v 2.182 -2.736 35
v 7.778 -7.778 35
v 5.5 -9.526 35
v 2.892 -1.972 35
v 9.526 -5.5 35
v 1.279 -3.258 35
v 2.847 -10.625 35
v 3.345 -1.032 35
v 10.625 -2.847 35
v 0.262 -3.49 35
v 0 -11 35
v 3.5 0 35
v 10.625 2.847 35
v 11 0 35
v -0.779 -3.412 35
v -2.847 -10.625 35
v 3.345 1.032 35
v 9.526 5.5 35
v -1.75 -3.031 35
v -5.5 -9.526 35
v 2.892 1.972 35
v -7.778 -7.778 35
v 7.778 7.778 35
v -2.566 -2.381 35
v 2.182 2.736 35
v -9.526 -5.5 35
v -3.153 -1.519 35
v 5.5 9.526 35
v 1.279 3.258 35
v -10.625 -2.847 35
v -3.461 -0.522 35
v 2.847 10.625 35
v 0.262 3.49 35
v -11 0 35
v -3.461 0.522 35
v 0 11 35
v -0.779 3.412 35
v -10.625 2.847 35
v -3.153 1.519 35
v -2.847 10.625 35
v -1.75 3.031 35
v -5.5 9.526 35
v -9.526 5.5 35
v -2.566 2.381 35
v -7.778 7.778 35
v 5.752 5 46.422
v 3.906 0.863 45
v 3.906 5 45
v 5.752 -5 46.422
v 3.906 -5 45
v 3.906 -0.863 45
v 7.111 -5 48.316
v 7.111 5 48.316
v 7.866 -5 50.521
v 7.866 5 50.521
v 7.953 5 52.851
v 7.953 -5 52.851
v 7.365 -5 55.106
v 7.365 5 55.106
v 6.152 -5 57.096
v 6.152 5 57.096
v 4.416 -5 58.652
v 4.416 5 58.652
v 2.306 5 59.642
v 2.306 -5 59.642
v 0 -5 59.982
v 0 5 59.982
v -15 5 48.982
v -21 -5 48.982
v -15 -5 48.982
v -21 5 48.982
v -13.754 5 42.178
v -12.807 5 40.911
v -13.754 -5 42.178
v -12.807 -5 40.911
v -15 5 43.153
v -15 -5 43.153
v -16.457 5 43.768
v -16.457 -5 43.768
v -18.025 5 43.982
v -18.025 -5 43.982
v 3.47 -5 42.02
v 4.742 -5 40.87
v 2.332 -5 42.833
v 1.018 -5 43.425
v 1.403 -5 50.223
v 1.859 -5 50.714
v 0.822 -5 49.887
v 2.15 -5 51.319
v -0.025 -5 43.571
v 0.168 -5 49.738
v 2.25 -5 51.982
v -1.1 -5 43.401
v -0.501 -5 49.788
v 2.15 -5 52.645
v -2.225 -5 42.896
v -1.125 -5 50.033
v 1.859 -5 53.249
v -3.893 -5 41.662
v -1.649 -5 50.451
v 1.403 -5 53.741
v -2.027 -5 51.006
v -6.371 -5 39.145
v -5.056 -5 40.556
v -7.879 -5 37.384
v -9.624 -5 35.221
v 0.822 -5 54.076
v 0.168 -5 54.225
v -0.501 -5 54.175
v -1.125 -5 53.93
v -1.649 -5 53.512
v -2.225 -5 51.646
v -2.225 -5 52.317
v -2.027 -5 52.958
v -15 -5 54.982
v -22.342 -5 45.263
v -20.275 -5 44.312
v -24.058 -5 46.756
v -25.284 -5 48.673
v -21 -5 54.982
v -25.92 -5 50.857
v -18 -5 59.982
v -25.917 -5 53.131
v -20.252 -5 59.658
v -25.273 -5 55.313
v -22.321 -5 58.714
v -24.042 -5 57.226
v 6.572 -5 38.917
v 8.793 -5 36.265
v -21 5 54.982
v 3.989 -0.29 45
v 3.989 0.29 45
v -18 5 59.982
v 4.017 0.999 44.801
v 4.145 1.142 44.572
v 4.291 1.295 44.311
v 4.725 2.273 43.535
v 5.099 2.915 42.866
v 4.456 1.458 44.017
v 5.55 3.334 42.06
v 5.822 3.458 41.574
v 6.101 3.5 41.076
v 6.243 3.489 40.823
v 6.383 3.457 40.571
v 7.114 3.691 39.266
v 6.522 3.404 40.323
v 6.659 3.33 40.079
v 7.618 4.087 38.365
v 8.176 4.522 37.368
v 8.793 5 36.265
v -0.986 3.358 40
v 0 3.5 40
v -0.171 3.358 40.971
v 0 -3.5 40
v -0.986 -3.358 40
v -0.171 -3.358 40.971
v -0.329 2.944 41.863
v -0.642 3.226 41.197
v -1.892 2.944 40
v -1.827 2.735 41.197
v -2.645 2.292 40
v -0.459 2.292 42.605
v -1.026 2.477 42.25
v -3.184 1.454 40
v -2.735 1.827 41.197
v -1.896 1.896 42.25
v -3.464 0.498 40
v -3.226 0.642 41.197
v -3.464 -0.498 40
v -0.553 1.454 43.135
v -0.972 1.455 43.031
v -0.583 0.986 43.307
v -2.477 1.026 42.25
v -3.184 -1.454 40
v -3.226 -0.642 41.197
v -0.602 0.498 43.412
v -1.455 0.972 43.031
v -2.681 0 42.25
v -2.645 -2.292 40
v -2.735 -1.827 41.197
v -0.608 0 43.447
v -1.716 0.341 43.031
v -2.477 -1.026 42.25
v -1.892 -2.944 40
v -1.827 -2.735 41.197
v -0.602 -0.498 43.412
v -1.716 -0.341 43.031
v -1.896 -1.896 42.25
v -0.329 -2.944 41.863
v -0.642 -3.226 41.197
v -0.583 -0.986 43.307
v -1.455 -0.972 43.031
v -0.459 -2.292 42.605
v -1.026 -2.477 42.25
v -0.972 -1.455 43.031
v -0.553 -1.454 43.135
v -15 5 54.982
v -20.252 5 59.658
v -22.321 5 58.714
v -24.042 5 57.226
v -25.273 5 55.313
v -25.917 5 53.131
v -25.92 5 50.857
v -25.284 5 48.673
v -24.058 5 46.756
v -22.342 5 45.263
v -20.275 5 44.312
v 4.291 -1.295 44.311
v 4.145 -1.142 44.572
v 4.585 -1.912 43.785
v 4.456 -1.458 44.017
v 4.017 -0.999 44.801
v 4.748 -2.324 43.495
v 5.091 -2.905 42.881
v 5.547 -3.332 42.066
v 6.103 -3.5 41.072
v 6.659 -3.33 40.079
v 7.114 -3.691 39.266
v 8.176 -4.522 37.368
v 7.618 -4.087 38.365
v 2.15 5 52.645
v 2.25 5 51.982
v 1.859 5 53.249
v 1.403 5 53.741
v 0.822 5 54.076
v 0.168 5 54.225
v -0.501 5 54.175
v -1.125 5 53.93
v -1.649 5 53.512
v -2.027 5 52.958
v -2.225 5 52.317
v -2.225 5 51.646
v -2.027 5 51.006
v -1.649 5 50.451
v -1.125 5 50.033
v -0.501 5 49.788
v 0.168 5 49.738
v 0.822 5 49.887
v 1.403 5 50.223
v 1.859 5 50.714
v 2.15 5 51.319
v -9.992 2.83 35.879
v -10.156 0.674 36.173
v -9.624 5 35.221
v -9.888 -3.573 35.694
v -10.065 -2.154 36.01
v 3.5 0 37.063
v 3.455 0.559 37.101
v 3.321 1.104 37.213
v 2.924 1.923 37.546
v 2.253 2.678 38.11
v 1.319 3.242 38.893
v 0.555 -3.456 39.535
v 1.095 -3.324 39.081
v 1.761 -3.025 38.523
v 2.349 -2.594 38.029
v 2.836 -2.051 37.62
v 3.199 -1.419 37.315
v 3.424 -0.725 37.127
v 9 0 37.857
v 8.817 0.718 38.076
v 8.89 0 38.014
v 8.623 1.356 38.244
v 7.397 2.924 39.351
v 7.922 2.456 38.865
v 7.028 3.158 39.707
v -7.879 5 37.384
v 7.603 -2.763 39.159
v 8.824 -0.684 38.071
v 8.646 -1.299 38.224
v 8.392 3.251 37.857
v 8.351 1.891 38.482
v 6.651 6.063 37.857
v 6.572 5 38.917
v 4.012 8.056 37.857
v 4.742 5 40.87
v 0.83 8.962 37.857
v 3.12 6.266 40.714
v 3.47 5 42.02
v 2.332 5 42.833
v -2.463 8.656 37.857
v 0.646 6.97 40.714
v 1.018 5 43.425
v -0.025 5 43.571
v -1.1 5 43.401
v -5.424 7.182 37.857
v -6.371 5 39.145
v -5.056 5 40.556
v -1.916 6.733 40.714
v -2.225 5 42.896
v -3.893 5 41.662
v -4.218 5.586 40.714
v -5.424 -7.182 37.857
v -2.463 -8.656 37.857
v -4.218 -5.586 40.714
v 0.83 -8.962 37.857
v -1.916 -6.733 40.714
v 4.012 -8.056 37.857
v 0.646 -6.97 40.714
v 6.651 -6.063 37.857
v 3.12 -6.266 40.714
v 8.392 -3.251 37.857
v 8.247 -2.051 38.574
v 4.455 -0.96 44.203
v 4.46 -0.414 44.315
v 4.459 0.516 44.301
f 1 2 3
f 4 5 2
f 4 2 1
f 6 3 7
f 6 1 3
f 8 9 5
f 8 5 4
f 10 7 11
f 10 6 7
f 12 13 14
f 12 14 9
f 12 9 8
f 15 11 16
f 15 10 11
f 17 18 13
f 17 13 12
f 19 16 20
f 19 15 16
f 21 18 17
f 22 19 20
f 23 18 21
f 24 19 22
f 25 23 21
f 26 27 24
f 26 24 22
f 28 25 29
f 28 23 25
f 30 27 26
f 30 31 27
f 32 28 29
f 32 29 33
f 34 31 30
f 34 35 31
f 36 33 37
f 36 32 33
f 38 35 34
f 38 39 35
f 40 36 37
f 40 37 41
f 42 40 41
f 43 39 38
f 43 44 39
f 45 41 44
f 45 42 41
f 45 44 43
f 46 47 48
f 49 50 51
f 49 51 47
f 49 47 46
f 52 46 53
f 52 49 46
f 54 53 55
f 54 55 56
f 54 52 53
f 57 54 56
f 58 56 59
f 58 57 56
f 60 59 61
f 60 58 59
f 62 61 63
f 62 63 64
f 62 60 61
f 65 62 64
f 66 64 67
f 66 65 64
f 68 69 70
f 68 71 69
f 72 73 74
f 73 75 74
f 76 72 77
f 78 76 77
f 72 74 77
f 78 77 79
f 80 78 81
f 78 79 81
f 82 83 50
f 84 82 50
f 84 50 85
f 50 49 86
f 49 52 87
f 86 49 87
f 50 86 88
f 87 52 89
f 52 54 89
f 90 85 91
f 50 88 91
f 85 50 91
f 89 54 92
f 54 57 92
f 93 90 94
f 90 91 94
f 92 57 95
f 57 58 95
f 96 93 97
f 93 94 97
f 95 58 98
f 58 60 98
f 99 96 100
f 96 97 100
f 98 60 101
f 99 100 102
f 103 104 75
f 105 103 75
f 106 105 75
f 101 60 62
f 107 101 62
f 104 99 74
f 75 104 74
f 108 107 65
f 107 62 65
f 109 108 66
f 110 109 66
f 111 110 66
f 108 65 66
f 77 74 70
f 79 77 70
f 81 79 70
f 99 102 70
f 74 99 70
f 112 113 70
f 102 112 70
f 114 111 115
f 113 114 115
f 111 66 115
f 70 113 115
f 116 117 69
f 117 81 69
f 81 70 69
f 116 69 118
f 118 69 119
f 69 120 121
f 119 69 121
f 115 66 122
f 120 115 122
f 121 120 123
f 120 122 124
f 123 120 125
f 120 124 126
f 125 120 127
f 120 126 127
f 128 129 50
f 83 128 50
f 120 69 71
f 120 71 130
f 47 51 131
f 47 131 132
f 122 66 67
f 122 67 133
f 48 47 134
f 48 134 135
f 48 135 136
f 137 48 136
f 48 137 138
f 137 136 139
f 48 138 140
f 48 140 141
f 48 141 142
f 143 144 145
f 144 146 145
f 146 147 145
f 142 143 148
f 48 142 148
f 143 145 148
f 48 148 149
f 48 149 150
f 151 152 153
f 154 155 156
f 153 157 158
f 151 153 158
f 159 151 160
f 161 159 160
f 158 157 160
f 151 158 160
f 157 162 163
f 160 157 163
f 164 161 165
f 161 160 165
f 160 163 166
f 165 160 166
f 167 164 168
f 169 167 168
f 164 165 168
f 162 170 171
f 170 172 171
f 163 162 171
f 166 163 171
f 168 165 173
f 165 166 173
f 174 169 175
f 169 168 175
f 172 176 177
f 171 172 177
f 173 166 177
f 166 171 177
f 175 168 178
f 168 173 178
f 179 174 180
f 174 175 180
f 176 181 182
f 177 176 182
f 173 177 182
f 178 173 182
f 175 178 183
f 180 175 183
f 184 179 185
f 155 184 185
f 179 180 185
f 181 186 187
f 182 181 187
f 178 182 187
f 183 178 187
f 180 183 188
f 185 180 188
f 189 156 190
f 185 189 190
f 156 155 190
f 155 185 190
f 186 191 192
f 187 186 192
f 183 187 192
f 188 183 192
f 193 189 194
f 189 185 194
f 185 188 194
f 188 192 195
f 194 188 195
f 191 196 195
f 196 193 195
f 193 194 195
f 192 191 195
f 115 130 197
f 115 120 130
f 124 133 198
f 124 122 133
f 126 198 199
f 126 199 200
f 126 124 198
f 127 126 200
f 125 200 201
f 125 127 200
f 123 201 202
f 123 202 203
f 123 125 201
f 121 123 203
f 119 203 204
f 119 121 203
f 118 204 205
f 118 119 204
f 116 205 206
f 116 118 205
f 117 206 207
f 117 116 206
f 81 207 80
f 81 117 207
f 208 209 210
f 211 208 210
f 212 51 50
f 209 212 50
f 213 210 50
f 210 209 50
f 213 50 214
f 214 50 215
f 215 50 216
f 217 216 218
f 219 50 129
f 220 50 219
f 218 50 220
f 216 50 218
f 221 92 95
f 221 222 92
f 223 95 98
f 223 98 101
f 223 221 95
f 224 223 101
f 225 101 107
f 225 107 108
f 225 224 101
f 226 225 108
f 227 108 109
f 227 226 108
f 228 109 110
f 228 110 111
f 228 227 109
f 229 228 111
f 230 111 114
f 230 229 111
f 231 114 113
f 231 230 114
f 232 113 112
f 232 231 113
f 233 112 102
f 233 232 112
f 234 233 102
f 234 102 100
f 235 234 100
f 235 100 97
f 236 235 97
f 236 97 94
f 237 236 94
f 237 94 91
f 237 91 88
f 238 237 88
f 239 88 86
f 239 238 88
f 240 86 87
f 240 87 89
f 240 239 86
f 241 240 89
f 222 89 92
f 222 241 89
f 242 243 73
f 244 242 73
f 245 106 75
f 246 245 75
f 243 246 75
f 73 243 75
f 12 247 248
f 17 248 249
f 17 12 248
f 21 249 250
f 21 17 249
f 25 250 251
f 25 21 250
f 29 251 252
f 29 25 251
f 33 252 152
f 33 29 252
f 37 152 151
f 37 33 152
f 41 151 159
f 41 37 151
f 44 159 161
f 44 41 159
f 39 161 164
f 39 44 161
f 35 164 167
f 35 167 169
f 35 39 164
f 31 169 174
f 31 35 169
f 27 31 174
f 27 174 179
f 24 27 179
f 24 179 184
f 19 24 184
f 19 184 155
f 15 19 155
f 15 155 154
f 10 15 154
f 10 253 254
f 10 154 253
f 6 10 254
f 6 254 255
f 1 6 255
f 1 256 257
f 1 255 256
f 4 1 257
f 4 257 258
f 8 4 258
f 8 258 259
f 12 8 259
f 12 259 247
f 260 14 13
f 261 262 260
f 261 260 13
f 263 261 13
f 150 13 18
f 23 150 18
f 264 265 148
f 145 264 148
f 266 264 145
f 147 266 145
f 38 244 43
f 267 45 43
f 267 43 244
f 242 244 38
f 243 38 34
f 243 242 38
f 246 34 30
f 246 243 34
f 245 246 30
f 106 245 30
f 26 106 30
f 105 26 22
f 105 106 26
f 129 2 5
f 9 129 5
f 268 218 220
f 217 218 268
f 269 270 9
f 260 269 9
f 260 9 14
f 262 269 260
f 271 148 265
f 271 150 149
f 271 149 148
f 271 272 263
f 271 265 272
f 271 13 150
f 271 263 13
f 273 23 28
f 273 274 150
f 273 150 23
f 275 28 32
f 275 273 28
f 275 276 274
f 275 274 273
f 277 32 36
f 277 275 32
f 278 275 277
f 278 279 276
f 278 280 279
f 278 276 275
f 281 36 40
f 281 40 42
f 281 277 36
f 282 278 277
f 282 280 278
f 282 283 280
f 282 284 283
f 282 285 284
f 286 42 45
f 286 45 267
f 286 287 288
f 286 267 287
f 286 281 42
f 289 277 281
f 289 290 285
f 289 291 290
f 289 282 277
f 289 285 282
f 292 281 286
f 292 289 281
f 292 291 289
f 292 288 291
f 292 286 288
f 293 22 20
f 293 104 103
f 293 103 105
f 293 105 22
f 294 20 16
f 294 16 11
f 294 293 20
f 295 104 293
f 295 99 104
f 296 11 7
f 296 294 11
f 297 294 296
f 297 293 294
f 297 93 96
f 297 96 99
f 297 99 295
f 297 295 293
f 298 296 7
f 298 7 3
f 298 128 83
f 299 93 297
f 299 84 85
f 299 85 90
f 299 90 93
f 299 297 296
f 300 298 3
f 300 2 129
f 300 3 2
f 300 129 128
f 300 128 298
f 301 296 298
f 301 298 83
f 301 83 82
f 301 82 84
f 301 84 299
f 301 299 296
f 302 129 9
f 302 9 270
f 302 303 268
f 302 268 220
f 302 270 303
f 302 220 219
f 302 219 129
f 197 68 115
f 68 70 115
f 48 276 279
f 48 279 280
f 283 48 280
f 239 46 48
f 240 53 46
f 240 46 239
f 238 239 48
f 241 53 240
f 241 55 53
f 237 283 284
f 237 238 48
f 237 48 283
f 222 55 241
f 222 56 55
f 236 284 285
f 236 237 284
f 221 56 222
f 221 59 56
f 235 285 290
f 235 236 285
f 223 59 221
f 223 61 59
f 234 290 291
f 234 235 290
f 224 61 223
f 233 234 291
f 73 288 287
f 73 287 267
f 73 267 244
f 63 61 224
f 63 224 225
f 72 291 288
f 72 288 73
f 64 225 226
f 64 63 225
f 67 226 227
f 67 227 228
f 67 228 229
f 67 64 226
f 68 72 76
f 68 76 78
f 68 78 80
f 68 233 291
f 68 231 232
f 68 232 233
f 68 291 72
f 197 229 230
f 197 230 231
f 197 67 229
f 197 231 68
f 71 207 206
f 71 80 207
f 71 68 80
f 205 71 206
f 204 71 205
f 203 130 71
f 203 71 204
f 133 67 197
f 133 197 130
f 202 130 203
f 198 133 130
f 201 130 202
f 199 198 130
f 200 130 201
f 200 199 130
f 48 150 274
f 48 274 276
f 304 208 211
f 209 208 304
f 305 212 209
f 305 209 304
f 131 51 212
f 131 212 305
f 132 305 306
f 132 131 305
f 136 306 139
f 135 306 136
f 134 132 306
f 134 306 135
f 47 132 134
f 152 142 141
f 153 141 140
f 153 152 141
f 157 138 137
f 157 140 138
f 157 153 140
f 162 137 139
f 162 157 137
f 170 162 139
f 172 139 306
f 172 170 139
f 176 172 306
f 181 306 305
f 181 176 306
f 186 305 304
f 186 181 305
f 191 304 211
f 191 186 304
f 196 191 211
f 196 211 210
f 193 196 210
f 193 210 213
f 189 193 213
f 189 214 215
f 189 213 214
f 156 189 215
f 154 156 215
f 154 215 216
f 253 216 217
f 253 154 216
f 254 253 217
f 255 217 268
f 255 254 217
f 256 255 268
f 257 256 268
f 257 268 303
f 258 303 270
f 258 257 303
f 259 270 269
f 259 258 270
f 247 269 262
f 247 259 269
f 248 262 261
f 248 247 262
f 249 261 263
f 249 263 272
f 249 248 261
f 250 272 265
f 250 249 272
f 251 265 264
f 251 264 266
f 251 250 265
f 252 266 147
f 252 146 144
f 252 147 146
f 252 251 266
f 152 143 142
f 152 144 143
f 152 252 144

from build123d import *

# Parameters (mm, degrees)
SKETCH023_R       = 2.25
SKETCH023_W       = 6
SKETCH023_H       = 6
PAD017_DEPTH      = 5
CYLINDER060_R     = 3.5
CYLINDER060_DEPTH = 5
CYLINDER061_R     = 3.5
CYLINDER061_DEPTH = 10


with BuildPart() as part:
    # Sketch023 → Pad017 (new body, symmetric)
    with BuildSketch(Plane.XZ):
        with BuildLine():
            Line((-9.5, 0), (-12.806838, 5.911152))
            ThreePointArc((-12.806838, 5.911152), (-15.000053, 8.152854), (-18.024663, 8.981801))
            ThreePointArc((-18, 24.981763), (-25.99999, 16.994094), (-18.024663, 8.981801))
            Line((0, 24.981763), (-18, 24.981763))
            ThreePointArc((3.905763, 10), (7.741256, 18.999918), (0, 24.981763))
            Line((3.905763, 10), (9.5, 0))
            Line((-9.5, 0), (9.5, 0))
        make_face()
        with Locations((0, 16.981763)):
            Circle(SKETCH023_R, mode=Mode.SUBTRACT)
        with Locations((-18, 16.981763)):
            Rectangle(SKETCH023_W, SKETCH023_H, mode=Mode.SUBTRACT)
    extrude(amount=PAD017_DEPTH, both=True)

    # Cone004 → Cone004 (revolve)
    with BuildSketch(Plane.XZ):
        Polygon((0, 0), (11, 0), (4, 10), (0, 10), align=None)
    revolve(axis=Axis((0, 0, 0), (0, 0, 1)))

    # Cylinder060 → Cylinder060 (cut)
    with BuildSketch(Plane.XY):
        Circle(CYLINDER060_R)
    extrude(amount=CYLINDER060_DEPTH, mode=Mode.SUBTRACT)

    # Cylinder061 → Cylinder061 (cut)
    with BuildSketch(Plane(origin=(0, 0, 5), x_dir=(0, 1, 0), z_dir=(0.984808, 0, 0.173648))):
        Circle(CYLINDER061_R)
    extrude(amount=CYLINDER061_DEPTH, mode=Mode.SUBTRACT)

    # Sphere001 → Sphere001 (revolve, cut)
    with BuildSketch(Plane(origin=(0, 0, 5), x_dir=(1, 0, 0), z_dir=(0, -1, 0))):
        with BuildLine():
            ThreePointArc((0, -3.5), (3.5, 0), (0, 3.5))
            Line((0, 3.5), (0, -3.5))
        make_face()
    revolve(axis=Axis((0, 0, 5), (0, 0, 1)), mode=Mode.SUBTRACT)


with BuildPart() as part_1:
    # Body029 placement: moved
    add(part.part.moved(Location((0, 0, 35))))


solid = part_1.part
